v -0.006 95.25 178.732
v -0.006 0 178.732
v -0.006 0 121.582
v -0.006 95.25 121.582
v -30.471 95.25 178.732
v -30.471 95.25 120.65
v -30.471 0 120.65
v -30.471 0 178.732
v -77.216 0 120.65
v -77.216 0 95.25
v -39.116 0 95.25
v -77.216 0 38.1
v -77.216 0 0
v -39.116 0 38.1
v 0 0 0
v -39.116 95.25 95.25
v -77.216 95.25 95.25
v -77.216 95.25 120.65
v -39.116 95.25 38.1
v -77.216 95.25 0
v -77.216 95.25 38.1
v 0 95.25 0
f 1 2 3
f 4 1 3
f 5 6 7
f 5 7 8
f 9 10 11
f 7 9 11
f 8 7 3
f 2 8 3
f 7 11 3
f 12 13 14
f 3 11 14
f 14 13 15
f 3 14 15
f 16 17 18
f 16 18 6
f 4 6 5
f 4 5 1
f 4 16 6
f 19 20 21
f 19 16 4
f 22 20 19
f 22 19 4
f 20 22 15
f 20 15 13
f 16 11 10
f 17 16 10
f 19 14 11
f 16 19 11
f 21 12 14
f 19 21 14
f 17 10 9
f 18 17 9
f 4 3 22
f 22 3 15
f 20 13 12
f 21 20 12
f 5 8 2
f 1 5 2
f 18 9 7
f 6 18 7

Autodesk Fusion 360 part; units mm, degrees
sketch "Sketch3" plane through (0, 0, 0) normal (0, 1, 0) x (1, 0, 0)
  line L0 (0, 0) -> (-77.216, 0)
  line L1 (-77.216, 0) -> (-77.216, -38.1)
  line L2 (-77.216, -38.1) -> (-39.116, -38.1)
  line L3 (-39.116, -38.1) -> (-39.116, -95.25)
  line L4 (-39.116, -95.25) -> (-77.216, -95.25)
  line L5 (-77.216, -95.25) -> (-77.216, -120.65)
  line L6 (-77.216, -120.65) -> (-30.4714, -120.65)
  line L7 (-0.0056, -121.5825) -> (0, 0)
  line L8 (-30.4714, -120.65) -> (-30.4714, -178.7325)
  line L9 (-30.4714, -178.7325) -> (-0.0056, -178.7325)
  line L10 (-0.0056, -178.7325) -> (-0.0056, -121.5825)
  dimension "d9" = 77.216
  dimension "d10" = 38.1
  dimension "d11" = 38.1
  dimension "d12" = 57.15
  dimension "d13" = 38.1
  dimension "d14" = 25.4
  dimension "d15" = 77.216
  dimension "d17" = 57.15
extrude "Extrude2" add sketch "Sketch3" along normal blind 95.25
